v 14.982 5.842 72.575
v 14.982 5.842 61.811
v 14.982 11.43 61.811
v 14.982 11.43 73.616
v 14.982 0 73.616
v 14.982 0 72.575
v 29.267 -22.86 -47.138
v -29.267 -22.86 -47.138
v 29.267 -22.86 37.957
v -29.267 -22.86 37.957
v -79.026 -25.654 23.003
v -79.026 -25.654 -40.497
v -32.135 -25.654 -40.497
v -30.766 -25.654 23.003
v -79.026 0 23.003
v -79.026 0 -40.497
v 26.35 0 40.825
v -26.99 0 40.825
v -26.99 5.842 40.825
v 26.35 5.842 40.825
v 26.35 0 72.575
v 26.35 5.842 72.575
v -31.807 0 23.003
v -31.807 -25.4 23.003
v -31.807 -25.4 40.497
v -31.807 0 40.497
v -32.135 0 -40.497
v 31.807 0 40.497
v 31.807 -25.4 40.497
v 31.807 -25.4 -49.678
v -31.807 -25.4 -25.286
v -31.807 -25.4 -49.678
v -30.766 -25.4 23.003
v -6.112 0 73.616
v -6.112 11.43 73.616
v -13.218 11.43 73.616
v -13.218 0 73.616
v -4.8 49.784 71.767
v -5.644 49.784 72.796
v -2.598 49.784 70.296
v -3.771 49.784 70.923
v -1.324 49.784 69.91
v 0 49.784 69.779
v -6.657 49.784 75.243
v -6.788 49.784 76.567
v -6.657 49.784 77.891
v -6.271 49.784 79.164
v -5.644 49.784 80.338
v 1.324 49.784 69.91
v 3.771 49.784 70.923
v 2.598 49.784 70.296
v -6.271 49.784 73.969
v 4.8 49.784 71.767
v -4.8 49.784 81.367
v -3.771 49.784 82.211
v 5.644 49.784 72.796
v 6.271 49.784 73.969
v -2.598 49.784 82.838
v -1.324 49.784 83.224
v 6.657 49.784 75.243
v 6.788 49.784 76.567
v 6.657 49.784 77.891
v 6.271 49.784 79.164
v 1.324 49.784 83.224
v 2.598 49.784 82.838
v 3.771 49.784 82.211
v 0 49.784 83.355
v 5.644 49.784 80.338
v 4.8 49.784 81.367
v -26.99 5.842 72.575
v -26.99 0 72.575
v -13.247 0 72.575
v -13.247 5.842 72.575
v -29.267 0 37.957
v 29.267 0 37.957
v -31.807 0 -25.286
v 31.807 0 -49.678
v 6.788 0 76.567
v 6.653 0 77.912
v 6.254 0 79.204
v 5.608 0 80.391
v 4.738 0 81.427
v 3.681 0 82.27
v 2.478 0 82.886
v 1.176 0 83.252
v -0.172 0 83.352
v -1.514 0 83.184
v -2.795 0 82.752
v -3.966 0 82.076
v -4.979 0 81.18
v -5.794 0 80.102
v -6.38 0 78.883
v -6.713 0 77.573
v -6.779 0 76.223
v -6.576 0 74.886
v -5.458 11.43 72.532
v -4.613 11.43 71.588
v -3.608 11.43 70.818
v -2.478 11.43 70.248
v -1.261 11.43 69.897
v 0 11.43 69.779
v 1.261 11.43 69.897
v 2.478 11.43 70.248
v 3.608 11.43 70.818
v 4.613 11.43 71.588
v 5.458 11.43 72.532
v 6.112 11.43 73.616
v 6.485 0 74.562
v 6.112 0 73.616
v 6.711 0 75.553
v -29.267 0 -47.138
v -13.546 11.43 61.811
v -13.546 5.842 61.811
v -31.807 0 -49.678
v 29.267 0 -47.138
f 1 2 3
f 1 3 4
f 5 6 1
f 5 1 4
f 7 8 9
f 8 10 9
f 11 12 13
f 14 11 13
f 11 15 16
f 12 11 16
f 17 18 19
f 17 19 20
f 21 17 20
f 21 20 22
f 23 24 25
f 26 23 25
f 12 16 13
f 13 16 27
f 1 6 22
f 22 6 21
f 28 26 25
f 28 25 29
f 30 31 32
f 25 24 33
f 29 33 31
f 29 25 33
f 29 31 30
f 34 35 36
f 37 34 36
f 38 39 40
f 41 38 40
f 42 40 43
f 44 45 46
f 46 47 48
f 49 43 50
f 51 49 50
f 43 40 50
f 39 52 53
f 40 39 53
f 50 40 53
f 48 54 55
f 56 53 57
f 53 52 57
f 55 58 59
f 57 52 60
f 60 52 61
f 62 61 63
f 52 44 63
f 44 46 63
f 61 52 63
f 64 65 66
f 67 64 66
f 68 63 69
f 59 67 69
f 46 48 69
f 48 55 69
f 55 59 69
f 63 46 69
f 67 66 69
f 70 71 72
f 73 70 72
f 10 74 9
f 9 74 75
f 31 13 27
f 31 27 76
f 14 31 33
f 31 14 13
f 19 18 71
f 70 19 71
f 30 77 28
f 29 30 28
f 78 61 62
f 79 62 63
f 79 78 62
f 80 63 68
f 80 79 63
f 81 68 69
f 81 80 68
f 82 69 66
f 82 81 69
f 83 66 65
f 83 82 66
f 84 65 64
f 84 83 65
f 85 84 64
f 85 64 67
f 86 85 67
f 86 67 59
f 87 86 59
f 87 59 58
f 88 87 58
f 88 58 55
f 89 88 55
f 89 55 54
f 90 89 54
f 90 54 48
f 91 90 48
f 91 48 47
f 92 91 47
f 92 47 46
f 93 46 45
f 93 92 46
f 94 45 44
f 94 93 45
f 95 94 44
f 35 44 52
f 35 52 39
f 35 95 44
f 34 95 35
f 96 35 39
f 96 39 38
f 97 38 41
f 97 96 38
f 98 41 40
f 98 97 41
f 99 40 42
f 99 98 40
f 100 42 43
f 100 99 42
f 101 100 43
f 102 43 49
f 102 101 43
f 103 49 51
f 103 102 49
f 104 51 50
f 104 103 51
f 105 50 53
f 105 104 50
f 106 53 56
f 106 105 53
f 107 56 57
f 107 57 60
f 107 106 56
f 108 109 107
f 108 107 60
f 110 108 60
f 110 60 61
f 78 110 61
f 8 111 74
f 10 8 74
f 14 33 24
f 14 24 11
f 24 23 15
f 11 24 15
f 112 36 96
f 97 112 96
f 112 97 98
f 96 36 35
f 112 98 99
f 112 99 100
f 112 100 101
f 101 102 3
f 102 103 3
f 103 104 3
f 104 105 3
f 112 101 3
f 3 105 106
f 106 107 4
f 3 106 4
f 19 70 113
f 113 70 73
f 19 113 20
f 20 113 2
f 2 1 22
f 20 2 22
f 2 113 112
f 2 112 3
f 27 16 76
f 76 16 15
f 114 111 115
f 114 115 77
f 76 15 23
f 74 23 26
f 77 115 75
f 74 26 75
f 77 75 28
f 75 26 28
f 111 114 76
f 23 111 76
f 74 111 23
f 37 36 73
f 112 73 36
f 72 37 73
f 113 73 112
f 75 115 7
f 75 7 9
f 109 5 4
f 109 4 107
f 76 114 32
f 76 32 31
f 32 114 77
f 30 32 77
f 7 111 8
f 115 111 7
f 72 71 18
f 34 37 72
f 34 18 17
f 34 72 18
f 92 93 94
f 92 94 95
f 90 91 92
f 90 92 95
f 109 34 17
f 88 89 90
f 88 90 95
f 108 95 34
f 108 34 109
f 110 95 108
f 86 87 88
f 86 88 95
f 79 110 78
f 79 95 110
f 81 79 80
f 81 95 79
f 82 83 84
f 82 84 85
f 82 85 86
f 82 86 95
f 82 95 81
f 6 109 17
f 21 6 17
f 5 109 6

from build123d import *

# Parameters (mm, degrees)
F0_W      = 63.614506
F0_H      = 90.175208
F1_DEPTH  = 25.4
F2_T      = -2.54
F4_DEPTH  = 25.654
F5_W      = 53.34
F5_H      = 31.75
F6_DEPTH  = 5.842
F8_DEPTH  = 11.43
F9_R      = 6.78763
F10_DEPTH = 49.784


with BuildPart() as f1:
    # F0 (on Front) → F1 (new body)
    with BuildSketch(Plane.XZ):
        with Locations((-2e-06, -4.590737)):
            Rectangle(F0_W, F0_H)
    extrude(amount=F1_DEPTH)

    # F2
    f2_openings = [f1.faces().sort_by_distance(p)[0] for p in [
        (-2e-06, 0, -4.590737),
    ]]
    offset(amount=F2_T, openings=f2_openings)

    # F3 (on Front) → F4 (join)
    with BuildSketch(Plane.XZ):
        Polygon((-32.135166, -40.496867), (-30.766274, 23.003133), (-79.026274, 23.003133), (-79.026274, -40.496867), align=None)
    extrude(amount=F4_DEPTH)


with BuildPart() as f6:
    # F5 (on Front) → F6 (new body)
    with BuildSketch(Plane.XZ):
        with Locations((-0.320101, 56.699775)):
            Rectangle(F5_W, F5_H)
    extrude(amount=-F6_DEPTH)

    # F7 (on Front) → F8 (join)
    with BuildSketch(Plane.XZ):
        Polygon((-13.545804, 61.811004), (14.982359, 61.811004), (14.982359, 73.61576), (-13.217889, 73.61576), align=None)
    extrude(amount=-F8_DEPTH)

    # F9 (on Front) → F10 (join)
    with BuildSketch(Plane.XZ):
        with Locations((0, 76.566949)):
            Circle(F9_R)
    extrude(amount=-F10_DEPTH)


solid = Compound([f1.part, f6.part])
